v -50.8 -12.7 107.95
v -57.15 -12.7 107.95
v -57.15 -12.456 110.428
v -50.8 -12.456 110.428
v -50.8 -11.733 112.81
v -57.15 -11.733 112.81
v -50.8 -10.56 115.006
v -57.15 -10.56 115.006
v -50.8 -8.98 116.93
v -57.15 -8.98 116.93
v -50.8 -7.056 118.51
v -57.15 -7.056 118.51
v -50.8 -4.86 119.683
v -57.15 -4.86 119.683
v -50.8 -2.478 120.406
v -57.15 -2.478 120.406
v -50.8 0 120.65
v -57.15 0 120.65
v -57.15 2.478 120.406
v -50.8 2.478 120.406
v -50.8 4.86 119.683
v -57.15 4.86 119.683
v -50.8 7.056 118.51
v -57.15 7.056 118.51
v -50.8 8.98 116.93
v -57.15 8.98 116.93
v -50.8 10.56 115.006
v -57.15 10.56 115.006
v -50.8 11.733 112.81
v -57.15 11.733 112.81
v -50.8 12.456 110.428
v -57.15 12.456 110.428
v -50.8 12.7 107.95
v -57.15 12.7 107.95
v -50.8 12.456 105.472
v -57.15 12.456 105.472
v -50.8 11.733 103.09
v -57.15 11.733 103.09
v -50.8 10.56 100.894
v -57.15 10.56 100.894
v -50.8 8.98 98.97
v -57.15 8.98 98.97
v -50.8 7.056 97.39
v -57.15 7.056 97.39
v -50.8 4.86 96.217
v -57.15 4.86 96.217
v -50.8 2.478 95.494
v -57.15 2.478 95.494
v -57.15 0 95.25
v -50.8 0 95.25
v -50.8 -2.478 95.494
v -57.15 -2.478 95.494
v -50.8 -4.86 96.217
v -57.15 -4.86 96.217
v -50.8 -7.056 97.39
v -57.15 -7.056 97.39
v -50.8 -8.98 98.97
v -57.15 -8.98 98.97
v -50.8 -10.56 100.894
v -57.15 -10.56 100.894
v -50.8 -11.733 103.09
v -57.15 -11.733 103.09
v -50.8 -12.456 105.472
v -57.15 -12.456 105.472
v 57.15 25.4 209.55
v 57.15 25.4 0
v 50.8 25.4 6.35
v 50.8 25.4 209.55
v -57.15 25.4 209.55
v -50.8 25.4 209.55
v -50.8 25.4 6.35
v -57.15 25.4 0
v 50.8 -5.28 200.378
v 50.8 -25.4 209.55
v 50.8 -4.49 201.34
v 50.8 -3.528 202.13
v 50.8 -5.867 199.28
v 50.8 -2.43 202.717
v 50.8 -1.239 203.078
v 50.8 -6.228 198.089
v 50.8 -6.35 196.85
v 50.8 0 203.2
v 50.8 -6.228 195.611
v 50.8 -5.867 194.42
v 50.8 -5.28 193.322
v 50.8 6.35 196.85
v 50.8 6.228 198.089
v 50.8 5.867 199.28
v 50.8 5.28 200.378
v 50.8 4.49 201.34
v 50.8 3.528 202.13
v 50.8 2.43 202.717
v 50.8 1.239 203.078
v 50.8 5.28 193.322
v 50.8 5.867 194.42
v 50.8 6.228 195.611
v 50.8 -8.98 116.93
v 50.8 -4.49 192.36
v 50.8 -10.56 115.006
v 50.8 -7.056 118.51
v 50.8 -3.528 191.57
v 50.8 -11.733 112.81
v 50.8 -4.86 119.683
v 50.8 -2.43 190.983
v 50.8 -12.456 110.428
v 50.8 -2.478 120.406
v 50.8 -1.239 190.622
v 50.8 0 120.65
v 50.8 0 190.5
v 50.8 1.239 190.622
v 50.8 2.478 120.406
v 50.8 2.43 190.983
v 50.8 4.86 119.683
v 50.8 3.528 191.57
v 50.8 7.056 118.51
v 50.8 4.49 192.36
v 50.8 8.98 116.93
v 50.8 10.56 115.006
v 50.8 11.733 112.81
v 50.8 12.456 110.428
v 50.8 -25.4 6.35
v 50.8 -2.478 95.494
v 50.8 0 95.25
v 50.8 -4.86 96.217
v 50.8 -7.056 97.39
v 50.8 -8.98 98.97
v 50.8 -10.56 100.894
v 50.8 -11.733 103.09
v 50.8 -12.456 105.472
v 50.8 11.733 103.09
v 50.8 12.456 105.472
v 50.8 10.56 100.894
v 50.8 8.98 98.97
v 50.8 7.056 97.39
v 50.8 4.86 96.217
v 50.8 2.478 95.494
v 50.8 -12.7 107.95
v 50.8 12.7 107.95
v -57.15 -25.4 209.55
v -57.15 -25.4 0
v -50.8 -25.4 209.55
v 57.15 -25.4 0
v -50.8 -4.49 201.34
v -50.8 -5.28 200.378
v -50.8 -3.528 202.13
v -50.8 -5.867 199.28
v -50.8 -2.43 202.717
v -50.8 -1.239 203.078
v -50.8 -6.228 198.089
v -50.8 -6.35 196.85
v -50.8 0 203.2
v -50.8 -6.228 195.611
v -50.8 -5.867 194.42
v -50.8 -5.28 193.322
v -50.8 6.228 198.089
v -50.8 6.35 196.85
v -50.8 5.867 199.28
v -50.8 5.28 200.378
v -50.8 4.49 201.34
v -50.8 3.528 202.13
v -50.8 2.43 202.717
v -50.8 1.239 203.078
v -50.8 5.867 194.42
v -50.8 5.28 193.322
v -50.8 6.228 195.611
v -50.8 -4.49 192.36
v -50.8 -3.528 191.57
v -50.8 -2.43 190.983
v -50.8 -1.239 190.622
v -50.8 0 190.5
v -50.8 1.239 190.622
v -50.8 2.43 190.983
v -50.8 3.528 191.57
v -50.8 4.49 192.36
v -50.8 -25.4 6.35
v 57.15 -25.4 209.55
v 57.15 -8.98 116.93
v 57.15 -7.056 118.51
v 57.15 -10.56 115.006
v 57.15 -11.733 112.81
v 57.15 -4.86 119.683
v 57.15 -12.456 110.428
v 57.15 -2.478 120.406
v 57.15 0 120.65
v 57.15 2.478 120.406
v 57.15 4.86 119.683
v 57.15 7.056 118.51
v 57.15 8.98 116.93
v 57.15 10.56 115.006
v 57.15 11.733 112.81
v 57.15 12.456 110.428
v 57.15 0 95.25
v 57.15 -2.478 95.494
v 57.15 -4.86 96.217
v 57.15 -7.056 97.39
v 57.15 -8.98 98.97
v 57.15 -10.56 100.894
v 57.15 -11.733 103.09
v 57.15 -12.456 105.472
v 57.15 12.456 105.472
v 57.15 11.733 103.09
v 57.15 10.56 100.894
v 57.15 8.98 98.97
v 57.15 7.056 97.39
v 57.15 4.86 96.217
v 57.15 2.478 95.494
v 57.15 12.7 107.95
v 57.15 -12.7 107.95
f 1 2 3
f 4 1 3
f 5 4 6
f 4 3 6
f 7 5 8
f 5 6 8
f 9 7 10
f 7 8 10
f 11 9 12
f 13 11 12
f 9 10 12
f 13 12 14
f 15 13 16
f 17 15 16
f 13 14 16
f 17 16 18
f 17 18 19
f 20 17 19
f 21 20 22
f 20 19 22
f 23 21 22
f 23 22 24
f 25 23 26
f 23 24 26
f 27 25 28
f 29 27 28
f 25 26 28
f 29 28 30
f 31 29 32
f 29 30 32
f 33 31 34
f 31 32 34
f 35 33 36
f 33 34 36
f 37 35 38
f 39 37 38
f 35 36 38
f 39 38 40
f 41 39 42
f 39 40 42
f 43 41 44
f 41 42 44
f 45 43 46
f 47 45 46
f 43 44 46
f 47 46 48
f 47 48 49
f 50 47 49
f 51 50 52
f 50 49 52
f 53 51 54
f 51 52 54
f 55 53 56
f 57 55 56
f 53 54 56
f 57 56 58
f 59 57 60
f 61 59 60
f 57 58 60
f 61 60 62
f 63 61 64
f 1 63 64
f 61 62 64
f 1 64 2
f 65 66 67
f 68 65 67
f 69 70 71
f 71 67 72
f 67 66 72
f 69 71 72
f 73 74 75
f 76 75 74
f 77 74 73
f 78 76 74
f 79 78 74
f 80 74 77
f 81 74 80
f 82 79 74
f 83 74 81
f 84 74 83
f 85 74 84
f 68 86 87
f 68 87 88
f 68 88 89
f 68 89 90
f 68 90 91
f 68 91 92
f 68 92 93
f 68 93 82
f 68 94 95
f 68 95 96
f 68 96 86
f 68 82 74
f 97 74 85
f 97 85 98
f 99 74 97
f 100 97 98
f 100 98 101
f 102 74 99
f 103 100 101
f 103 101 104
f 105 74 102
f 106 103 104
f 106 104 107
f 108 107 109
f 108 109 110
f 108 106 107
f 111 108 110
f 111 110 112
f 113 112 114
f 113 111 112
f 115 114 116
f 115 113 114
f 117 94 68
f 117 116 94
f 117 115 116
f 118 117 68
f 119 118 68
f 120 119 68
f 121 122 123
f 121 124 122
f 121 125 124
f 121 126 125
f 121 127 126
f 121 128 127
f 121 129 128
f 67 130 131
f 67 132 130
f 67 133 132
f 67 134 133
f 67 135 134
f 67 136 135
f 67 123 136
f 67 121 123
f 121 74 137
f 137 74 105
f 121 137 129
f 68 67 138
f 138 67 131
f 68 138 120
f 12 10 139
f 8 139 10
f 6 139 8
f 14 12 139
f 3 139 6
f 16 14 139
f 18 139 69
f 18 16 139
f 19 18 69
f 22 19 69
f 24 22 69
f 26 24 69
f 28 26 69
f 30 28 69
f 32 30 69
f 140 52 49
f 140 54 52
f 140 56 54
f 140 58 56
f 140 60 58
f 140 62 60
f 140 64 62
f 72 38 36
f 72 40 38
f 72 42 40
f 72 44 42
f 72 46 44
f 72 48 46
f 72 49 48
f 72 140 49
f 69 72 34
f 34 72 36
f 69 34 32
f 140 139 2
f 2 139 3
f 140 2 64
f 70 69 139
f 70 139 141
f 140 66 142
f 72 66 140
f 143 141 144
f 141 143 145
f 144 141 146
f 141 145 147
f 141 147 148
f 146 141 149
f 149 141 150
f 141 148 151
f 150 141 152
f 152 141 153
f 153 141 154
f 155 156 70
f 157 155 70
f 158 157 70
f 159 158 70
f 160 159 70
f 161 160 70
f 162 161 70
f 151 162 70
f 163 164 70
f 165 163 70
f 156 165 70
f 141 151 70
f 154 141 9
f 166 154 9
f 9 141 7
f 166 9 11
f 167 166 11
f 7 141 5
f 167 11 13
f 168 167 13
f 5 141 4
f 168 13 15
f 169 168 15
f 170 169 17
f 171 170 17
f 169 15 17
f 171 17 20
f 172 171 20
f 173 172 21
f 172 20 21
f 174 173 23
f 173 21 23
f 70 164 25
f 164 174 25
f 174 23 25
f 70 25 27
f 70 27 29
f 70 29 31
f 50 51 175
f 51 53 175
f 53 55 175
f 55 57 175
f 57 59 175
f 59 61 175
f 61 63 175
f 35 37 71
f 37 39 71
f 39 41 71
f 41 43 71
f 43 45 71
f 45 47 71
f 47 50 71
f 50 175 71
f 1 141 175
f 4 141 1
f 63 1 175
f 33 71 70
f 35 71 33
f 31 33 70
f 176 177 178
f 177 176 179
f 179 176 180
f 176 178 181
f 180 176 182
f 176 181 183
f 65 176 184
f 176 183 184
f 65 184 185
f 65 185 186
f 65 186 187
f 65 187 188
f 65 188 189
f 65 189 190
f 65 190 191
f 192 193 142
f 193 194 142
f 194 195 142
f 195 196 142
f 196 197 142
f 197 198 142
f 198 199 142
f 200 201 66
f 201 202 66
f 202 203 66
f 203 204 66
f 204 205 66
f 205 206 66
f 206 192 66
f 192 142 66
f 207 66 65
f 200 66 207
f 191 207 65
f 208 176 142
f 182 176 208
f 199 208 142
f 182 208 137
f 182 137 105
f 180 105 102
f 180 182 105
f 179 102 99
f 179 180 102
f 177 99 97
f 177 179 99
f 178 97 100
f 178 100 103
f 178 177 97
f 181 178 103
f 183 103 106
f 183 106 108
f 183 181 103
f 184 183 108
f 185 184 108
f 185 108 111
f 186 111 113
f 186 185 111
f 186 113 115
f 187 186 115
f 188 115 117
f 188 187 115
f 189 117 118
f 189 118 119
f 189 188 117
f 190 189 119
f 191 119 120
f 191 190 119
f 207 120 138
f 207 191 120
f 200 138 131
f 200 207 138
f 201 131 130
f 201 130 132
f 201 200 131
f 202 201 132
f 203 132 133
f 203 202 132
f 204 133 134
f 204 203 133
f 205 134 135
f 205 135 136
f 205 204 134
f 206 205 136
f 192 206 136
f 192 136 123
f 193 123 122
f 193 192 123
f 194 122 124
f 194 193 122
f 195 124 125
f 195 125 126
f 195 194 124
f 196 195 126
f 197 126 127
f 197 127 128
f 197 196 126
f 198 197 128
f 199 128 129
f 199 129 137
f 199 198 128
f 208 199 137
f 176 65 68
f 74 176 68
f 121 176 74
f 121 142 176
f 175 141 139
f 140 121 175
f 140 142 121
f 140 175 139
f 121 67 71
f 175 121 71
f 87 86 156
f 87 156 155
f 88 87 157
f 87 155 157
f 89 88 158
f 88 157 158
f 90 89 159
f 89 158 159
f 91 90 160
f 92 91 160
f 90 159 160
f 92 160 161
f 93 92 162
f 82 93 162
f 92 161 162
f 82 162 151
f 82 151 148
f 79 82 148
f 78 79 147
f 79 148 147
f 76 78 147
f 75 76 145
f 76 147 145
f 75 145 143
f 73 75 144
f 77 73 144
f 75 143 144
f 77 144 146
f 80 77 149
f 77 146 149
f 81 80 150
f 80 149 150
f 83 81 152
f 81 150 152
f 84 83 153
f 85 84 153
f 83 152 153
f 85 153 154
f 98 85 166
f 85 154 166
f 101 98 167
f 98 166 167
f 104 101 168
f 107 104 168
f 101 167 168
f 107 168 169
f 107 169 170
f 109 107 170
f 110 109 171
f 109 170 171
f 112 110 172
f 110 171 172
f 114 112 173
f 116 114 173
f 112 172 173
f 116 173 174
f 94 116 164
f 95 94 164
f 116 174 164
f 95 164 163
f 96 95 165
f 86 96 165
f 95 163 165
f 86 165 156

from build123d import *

# Parameters (mm, degrees)
F0_W     = 57.15
F0_H     = 50.8
F1_DEPTH = 6.35
F2_W     = 6.35
F2_H     = 50.8
F3_DEPTH = 203.2
F4_R     = 12.7
F5_DEPTH = 6.35
F7_R     = 6.35
F8_DEPTH = 101.6


with BuildPart() as f1:
    # F0 (on Top) → F1 (new body)
    with BuildSketch(Plane.XY):
        with Locations((-28.575, 0)):
            Rectangle(F0_W, F0_H)
    extrude(amount=F1_DEPTH)

    # F2 (on face) → F3 (join)
    with BuildSketch(Plane.XY.offset(6.35)):
        with Locations((-53.975, 0)):
            Rectangle(F2_W, F2_H)
    extrude(amount=F3_DEPTH)

    # F4 (on face) → F5 (cut, through all)
    with BuildSketch(Plane(origin=(-57.15, 0, 0), x_dir=(0, -1, 0), z_dir=(-1, 0, 0))):
        with Locations((0, 107.95)):
            Circle(F4_R)
    extrude(amount=-F5_DEPTH, mode=Mode.SUBTRACT)

    # F6: F1 across plane


with BuildPart() as f1_1:
    add(f1.part)
    add(f1.part.mirror(Plane.YZ))

    # F7 (on face) → F8 (join, through all)
    with BuildSketch(Plane.YZ.offset(-50.8)):
        with Locations((0, 196.85)):
            Circle(F7_R)
    extrude(amount=F8_DEPTH)


solid = f1_1.part
